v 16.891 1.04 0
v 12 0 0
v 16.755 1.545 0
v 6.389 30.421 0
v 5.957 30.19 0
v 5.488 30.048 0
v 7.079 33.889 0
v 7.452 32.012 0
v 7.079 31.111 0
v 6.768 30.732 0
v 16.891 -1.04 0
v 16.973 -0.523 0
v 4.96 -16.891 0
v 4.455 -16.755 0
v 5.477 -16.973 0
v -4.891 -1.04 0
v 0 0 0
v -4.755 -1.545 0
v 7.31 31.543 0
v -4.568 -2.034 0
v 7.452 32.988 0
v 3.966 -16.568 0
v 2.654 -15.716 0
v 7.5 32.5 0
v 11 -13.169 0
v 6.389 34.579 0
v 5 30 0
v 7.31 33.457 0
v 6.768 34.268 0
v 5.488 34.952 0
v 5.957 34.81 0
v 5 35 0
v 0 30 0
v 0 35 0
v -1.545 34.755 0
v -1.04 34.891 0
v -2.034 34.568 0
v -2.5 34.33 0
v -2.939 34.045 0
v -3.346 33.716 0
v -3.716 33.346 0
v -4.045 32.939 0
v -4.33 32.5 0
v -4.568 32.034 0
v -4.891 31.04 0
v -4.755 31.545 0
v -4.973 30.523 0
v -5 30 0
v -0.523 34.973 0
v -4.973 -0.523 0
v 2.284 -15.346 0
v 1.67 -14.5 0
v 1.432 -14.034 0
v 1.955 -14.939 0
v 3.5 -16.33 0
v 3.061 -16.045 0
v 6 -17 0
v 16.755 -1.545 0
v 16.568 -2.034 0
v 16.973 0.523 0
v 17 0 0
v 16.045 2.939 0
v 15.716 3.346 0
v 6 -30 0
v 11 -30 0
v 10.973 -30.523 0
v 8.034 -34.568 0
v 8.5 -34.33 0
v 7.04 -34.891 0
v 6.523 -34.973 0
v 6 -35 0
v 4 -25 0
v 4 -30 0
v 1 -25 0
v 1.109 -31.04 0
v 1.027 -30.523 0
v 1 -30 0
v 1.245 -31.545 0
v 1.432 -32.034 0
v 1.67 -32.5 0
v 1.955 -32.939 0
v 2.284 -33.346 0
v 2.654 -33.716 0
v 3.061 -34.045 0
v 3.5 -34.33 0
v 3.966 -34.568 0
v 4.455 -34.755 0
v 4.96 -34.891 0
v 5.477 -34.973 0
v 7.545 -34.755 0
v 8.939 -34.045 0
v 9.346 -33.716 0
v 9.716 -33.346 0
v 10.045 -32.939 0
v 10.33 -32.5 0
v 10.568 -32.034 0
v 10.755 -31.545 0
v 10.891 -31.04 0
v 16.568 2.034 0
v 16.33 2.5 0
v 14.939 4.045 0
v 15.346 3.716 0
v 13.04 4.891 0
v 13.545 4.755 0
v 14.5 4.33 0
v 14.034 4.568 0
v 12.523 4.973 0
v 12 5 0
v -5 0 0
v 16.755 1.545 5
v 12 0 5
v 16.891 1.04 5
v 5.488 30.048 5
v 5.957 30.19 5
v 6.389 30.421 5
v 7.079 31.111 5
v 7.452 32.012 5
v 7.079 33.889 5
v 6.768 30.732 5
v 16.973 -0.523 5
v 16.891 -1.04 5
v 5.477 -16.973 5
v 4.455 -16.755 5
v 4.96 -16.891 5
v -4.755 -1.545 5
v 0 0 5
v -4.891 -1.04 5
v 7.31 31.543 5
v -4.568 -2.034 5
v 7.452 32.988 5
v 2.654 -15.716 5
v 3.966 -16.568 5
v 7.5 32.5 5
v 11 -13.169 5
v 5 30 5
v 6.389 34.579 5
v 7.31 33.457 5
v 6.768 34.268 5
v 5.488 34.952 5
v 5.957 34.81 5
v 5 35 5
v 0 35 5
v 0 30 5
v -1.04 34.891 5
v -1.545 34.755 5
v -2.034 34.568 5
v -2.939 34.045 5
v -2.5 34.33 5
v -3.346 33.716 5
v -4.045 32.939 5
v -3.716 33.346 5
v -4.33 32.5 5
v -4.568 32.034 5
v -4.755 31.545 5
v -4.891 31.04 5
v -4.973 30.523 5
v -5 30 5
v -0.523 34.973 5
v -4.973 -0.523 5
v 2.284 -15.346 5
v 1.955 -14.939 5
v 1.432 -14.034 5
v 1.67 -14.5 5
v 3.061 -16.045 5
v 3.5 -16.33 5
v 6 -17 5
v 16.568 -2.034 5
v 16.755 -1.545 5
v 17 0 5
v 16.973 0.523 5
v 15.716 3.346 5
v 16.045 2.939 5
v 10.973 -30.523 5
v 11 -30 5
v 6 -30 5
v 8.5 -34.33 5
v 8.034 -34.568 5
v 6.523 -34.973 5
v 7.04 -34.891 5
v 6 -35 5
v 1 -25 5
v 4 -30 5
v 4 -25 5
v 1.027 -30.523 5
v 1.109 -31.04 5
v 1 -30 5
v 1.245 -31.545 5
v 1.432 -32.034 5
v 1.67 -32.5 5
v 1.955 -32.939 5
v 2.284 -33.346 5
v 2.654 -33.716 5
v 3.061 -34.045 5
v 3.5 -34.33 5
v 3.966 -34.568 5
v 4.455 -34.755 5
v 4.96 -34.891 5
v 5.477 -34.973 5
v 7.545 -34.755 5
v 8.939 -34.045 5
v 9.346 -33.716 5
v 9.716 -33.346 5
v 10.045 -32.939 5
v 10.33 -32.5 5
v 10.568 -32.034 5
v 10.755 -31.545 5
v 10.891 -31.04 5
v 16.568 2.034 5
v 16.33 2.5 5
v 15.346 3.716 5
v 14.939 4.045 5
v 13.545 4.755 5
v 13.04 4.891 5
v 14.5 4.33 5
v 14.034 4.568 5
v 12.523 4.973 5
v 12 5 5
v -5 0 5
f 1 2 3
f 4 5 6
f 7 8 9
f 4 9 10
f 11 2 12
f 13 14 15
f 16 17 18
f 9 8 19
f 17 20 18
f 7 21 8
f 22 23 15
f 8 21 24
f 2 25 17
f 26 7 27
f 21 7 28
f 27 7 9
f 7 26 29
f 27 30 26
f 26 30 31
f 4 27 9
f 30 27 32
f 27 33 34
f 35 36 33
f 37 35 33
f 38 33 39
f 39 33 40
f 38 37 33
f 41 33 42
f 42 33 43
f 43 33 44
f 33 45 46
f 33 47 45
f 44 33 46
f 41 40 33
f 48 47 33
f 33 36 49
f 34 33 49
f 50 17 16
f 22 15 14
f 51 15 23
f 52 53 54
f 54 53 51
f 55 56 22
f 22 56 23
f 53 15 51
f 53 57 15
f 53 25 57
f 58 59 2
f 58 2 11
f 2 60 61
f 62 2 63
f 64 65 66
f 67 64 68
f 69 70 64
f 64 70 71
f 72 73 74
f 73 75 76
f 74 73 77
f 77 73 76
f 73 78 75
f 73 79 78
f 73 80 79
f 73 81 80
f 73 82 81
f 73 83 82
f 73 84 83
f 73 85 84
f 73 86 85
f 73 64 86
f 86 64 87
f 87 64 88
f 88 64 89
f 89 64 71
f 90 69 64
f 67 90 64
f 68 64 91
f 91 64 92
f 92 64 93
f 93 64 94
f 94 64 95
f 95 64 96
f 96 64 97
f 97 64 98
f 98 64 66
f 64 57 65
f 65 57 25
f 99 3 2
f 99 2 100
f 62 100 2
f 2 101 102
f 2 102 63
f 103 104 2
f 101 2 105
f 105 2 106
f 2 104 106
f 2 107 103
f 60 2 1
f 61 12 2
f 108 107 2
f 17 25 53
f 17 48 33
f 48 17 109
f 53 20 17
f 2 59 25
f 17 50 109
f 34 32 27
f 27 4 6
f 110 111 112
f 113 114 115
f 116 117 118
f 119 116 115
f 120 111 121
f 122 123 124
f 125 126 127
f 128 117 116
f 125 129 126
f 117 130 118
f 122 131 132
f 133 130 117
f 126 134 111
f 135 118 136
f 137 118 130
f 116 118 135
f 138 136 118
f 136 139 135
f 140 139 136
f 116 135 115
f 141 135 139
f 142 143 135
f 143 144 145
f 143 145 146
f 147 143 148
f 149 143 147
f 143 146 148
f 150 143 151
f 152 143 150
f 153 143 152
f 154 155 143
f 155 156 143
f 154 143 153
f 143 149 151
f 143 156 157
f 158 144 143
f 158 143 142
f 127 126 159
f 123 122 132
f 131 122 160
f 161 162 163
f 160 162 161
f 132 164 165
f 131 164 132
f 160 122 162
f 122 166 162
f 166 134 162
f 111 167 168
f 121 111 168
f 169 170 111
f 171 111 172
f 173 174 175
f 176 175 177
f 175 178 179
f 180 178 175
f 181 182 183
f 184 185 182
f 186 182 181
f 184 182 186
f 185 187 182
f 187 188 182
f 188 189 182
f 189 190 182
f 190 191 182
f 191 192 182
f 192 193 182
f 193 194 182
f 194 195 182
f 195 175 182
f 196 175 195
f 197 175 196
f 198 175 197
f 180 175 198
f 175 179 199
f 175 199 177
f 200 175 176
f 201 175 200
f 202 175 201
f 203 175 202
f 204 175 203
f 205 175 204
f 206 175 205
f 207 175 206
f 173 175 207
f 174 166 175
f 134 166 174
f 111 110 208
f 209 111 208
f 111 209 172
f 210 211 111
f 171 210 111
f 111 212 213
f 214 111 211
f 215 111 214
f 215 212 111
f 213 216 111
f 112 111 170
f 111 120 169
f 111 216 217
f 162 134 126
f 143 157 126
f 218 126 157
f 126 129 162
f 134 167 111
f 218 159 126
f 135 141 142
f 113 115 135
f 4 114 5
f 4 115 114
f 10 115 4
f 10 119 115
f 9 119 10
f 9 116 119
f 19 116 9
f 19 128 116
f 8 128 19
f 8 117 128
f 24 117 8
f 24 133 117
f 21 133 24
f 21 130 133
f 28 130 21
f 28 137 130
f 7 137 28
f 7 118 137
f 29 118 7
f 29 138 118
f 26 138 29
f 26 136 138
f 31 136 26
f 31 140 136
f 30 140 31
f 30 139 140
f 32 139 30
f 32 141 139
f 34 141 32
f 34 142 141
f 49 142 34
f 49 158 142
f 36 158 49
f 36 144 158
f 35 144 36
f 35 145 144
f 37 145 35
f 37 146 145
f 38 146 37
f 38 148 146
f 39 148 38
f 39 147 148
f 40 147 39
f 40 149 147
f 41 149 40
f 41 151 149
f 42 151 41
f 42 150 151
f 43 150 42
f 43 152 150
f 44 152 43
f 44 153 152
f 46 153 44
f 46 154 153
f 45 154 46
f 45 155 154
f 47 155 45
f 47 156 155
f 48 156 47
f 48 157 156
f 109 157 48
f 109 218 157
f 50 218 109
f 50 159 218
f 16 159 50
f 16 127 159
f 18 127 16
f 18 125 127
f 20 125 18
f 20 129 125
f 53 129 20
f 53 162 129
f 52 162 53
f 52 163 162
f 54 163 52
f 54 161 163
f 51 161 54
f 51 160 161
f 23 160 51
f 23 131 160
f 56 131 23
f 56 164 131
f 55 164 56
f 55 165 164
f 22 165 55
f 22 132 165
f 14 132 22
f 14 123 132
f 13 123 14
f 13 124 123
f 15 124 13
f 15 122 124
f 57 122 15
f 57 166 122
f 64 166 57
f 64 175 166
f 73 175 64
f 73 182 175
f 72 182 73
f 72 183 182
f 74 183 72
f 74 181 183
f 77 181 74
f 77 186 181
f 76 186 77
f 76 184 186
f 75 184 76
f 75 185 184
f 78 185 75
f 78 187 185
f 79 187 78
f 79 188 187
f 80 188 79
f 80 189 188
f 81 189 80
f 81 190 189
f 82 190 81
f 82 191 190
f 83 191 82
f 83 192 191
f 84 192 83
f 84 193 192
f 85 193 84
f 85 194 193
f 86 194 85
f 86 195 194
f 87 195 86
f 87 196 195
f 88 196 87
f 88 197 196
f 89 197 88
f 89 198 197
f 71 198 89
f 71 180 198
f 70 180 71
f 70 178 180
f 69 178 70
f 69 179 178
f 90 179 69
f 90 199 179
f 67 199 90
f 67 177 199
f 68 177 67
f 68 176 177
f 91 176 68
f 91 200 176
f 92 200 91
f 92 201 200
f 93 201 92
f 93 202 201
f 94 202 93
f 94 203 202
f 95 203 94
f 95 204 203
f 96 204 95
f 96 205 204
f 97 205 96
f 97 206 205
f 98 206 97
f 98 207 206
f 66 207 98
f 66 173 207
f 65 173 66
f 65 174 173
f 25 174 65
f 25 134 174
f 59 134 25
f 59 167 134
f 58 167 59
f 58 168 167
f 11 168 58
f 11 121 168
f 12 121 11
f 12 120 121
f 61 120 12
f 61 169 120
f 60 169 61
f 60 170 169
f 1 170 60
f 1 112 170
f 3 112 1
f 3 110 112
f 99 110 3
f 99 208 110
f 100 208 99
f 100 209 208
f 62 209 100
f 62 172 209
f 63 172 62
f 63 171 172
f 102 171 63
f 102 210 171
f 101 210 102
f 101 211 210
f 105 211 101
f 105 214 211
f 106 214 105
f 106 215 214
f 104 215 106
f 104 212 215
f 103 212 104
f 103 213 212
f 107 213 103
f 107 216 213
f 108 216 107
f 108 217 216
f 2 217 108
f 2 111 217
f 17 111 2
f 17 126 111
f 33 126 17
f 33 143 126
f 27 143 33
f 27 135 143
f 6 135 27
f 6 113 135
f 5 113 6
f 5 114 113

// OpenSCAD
$fa=6;$fs=.5;

linear_extrude(5){difference(){
	union(){
hull(){
translate([5,32.5])circle(2.5);
translate([0,32.5])circle(2.5);
}hull(){
	
translate([0,30])circle(5);
translate([0,0])circle(5);

}hull(){
	translate([0,0])circle(5);
translate([12,0])circle(5);
}
hull(){
		translate([0,0])circle(5);
translate([12,0])circle(5);
		translate([6,-12])circle(5);
}
difference(){
hull(){
			translate([6,-12])circle(5);
			translate([6,-30])circle(5);

}
translate([0,-25])square([6,50]);
translate([4,-30])square([2,10]);

}
}

square([12,30]);
translate([10,16])square([50,50]);
}}
